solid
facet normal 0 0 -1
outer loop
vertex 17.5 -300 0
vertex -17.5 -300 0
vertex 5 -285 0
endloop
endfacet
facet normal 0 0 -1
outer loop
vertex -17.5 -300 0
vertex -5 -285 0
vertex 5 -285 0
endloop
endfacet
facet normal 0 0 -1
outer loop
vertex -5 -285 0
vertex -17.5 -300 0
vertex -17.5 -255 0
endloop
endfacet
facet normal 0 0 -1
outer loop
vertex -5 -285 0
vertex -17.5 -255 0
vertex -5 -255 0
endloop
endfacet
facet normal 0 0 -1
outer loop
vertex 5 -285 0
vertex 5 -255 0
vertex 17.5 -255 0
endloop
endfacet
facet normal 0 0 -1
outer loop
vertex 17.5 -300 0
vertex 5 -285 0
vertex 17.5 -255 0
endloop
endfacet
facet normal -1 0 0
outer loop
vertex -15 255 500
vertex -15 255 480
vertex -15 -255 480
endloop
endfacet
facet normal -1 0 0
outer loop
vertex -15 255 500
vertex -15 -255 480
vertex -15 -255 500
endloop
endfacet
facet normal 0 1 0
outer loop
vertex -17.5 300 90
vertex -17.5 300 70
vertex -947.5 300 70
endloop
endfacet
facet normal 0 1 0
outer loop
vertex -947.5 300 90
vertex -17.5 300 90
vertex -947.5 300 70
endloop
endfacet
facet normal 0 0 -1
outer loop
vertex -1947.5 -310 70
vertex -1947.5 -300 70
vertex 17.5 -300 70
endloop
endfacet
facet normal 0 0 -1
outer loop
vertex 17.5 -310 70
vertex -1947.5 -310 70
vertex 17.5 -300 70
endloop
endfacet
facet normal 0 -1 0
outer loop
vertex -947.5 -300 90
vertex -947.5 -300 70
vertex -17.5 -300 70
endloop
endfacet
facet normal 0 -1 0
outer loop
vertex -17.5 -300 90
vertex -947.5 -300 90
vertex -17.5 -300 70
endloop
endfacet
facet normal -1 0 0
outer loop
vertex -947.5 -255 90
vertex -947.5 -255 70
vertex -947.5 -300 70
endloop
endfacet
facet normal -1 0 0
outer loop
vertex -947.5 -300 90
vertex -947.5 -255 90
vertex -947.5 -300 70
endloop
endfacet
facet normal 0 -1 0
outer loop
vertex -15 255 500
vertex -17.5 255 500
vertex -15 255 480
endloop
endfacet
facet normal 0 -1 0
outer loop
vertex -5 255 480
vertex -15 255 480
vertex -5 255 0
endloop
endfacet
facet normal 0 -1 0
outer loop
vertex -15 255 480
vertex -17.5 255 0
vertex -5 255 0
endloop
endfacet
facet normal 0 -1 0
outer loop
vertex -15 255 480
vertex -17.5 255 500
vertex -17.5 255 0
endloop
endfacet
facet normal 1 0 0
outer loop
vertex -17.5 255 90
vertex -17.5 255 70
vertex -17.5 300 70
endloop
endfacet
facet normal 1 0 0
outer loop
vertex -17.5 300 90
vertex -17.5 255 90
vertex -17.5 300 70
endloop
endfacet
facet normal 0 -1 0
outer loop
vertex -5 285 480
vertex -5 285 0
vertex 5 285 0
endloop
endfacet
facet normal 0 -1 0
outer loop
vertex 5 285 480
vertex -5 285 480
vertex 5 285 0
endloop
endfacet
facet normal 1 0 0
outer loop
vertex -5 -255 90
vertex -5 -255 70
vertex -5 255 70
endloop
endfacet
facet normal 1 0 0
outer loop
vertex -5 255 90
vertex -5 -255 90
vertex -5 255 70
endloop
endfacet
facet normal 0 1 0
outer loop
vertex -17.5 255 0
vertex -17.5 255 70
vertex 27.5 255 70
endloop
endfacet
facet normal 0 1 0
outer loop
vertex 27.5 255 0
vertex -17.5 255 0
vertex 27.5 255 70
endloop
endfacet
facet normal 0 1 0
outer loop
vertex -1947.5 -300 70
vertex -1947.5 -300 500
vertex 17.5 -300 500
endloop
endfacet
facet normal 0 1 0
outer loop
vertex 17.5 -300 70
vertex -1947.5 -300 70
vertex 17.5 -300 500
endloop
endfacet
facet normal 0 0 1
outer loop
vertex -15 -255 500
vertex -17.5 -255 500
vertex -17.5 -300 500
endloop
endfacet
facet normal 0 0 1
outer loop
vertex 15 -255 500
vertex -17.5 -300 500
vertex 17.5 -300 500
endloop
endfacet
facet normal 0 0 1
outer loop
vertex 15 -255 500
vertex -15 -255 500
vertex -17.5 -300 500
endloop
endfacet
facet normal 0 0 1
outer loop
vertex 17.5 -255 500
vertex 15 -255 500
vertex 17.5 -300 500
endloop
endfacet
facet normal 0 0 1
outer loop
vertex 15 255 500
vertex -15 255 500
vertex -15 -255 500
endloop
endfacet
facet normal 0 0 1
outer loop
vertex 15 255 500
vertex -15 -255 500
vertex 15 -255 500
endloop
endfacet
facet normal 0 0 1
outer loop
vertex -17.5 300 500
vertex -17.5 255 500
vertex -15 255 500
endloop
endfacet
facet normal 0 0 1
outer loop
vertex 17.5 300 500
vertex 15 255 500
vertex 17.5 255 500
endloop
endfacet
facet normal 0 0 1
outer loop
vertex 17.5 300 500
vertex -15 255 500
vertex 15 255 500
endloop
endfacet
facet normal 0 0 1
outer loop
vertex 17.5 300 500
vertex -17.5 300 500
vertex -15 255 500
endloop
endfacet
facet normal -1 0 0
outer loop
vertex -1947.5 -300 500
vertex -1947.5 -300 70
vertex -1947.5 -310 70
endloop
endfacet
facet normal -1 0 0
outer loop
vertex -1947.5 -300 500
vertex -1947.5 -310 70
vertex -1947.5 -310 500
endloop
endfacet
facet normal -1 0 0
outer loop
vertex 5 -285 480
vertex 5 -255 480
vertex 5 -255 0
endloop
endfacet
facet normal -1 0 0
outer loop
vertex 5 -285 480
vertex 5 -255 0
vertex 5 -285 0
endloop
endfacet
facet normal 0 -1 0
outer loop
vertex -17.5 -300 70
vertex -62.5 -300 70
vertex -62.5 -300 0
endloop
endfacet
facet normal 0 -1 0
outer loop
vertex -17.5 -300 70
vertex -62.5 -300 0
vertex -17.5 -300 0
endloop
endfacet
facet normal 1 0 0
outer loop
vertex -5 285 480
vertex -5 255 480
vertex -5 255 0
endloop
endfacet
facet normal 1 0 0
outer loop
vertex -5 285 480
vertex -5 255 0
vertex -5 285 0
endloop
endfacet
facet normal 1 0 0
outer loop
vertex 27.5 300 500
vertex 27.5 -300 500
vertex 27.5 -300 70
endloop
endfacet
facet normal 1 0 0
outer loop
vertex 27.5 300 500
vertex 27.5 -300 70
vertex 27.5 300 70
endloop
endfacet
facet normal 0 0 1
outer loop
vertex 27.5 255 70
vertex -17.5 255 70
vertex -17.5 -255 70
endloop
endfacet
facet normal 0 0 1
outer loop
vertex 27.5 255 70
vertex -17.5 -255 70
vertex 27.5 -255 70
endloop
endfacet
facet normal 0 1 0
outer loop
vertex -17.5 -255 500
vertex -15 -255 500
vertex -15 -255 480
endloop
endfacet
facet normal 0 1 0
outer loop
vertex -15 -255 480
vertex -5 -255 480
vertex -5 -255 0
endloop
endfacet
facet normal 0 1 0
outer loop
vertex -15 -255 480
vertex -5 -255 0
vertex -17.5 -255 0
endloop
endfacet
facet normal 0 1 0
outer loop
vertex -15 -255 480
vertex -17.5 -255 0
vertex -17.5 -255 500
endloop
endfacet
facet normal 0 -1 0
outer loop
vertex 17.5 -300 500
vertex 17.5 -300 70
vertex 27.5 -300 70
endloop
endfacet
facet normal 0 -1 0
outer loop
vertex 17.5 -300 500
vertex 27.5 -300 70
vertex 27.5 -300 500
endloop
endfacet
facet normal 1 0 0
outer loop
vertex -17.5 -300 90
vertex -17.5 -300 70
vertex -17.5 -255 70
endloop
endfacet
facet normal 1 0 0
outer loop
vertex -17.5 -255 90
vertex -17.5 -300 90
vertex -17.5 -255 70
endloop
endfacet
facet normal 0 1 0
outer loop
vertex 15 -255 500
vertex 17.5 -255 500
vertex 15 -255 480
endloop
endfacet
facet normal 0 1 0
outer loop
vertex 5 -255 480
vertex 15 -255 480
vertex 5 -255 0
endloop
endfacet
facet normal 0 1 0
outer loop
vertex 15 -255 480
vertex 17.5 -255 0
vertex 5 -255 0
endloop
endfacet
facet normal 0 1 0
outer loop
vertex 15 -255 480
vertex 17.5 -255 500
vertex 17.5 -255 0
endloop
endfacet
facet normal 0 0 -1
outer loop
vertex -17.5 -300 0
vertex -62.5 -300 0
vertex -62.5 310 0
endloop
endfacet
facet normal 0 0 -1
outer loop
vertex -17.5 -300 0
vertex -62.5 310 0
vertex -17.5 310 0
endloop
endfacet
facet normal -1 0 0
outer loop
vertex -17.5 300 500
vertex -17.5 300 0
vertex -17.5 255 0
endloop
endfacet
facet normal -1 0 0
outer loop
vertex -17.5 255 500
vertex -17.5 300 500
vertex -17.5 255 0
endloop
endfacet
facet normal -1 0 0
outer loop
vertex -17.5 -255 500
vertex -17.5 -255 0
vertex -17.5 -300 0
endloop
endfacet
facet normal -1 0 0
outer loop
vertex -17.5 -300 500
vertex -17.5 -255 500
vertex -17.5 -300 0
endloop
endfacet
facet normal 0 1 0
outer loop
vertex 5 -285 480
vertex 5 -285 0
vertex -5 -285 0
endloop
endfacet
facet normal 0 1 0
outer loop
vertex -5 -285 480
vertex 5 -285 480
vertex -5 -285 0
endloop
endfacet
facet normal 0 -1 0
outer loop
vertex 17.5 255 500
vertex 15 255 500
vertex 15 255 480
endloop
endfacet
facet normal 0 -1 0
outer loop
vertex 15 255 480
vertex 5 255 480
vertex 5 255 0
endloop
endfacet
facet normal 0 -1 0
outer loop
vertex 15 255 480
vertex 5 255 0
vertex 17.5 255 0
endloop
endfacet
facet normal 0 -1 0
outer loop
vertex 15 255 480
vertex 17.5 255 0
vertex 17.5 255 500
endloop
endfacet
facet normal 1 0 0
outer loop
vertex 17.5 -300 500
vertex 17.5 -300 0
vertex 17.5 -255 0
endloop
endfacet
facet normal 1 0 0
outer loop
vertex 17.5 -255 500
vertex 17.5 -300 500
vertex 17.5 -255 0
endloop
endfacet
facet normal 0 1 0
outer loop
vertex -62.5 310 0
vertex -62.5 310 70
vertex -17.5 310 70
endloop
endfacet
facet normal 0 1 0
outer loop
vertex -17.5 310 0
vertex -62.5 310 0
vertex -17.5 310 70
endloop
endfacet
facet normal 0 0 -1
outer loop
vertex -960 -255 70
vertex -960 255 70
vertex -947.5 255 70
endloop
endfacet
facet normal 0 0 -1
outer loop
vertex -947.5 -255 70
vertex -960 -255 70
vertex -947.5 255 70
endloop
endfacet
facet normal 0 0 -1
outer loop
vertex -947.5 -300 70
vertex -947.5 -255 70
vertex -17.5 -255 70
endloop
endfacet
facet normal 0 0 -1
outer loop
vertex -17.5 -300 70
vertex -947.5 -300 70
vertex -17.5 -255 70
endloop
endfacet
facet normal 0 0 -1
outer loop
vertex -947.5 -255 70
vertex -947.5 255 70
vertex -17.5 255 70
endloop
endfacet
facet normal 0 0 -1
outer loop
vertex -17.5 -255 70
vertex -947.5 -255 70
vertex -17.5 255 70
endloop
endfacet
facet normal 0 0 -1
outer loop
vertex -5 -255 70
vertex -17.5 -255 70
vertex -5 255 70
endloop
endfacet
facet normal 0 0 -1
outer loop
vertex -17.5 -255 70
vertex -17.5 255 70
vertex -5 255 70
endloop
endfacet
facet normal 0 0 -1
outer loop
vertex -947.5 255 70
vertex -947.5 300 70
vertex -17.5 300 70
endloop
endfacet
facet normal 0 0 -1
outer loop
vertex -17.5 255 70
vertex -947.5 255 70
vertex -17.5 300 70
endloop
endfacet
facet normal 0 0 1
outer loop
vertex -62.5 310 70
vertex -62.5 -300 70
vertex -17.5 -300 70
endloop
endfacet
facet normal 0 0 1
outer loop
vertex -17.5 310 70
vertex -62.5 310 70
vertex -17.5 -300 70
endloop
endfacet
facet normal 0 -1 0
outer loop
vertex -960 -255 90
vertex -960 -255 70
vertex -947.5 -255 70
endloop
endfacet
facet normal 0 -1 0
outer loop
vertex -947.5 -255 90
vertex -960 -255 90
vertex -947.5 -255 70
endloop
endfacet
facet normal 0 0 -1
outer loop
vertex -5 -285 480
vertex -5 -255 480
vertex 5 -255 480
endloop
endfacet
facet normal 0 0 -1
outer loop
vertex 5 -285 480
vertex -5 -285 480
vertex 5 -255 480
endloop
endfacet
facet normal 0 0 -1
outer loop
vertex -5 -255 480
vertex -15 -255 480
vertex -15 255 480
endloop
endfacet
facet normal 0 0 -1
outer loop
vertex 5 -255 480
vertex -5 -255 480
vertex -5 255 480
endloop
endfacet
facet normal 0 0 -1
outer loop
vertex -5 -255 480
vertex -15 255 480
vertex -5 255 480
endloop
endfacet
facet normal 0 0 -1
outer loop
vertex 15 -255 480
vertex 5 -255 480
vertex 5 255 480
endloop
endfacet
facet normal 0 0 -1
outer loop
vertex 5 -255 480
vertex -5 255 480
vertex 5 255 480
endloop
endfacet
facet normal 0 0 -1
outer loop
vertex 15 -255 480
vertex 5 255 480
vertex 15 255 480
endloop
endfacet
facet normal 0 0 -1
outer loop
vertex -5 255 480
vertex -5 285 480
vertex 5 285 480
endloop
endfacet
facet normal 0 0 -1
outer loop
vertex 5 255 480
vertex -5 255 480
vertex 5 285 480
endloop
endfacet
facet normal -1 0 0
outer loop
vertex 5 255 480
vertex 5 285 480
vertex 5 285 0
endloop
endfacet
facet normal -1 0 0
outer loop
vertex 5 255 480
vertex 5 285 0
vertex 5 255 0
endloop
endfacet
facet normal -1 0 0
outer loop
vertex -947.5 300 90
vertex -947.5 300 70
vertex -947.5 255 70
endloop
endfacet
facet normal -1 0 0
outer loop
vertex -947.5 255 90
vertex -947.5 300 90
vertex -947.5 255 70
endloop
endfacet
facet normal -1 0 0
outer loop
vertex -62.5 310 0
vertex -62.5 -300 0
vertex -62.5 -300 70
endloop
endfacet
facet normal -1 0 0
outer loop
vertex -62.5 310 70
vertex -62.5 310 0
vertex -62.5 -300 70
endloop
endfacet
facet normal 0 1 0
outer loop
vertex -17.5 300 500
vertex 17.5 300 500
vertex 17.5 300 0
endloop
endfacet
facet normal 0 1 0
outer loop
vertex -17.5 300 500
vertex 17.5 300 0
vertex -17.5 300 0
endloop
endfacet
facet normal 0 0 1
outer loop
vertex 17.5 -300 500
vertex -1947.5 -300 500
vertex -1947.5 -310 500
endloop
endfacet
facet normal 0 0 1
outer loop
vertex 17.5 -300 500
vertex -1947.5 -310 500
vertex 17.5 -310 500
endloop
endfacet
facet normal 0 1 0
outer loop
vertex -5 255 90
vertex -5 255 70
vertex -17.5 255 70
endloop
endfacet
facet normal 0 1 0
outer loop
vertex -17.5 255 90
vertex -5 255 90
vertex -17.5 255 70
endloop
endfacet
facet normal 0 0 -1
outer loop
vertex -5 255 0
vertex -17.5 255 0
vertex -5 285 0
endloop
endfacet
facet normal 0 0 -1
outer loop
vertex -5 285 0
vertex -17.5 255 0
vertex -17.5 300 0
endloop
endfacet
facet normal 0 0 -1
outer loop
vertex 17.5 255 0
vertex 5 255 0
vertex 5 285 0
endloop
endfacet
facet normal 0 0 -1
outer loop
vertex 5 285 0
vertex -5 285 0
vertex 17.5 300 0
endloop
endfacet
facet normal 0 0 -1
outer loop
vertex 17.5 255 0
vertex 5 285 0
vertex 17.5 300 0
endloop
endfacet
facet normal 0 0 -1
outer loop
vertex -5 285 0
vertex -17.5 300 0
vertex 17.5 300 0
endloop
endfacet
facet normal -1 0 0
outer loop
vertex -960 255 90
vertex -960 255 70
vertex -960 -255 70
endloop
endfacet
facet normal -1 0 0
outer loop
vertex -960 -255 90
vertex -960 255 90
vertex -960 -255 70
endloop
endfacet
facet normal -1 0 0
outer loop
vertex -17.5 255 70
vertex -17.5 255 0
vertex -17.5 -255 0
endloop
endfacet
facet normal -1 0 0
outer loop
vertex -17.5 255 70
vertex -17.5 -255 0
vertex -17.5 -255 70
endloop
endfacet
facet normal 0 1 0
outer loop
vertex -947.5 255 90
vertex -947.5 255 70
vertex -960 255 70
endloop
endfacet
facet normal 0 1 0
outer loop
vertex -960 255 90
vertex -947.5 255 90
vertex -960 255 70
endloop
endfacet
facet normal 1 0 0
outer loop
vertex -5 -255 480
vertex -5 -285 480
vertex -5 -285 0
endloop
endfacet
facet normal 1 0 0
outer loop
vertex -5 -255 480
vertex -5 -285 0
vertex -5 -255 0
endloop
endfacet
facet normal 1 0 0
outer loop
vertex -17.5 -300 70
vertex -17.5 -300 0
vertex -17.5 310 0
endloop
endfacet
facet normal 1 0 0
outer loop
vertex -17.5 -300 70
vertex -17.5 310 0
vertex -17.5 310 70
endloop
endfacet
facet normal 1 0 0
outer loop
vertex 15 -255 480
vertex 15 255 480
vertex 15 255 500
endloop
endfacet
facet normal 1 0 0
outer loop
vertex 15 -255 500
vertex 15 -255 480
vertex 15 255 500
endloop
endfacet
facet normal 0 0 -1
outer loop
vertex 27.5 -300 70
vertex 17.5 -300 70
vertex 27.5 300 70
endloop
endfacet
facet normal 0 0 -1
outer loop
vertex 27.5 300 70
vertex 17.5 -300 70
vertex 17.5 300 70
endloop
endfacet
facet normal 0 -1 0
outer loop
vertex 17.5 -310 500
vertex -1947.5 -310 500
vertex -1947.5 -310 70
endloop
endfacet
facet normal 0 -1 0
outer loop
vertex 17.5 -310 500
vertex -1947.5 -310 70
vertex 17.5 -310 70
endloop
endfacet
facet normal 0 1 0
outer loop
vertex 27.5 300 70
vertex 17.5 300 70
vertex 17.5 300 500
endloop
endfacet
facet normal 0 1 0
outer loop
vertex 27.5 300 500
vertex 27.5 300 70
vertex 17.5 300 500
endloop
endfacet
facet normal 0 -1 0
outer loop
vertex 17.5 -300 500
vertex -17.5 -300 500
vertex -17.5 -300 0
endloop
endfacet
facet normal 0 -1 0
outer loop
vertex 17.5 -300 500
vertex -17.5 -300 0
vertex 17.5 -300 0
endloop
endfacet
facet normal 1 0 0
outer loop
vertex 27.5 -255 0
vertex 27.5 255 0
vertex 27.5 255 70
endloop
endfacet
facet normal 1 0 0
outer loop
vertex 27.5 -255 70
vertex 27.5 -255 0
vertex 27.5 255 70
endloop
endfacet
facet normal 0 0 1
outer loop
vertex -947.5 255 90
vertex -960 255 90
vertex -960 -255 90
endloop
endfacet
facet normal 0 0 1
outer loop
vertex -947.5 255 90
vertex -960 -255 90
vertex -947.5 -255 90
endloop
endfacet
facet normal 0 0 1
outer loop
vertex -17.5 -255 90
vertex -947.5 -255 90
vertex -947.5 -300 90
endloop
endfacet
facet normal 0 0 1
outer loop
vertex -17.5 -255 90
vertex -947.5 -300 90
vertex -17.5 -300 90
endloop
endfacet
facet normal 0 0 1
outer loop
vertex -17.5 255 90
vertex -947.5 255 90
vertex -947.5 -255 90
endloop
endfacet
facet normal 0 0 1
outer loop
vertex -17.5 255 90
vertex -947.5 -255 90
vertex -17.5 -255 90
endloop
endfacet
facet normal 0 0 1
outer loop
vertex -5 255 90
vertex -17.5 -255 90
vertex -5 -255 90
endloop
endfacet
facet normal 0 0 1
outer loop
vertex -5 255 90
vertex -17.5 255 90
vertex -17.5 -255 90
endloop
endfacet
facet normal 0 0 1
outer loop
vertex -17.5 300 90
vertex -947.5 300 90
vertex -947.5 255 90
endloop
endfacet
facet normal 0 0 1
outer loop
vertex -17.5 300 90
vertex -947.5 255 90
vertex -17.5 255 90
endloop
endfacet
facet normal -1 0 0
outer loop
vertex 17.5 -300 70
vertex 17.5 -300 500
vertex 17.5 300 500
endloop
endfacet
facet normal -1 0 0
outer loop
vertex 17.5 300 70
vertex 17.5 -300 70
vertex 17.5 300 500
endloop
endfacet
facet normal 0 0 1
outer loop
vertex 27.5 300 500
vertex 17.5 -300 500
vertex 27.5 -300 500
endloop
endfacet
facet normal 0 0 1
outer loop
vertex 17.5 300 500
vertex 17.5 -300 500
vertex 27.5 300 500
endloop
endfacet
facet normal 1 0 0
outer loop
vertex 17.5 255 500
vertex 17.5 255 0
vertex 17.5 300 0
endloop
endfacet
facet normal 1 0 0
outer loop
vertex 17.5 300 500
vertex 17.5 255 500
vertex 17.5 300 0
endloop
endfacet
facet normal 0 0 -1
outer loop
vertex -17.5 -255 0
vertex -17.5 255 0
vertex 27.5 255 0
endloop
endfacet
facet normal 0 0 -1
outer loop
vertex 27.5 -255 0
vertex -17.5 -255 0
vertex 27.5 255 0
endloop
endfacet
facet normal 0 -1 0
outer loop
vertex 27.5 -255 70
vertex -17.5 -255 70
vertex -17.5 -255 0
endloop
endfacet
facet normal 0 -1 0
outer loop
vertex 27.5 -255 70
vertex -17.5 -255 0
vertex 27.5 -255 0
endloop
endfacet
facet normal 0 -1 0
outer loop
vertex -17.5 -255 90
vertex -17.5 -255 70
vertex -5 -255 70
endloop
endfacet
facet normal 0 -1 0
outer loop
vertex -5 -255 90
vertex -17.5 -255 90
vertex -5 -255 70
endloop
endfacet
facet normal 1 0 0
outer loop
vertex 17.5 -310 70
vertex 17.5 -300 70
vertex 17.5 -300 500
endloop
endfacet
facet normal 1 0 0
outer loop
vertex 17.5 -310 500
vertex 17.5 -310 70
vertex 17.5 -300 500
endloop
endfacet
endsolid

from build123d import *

# Parameters (mm, degrees)
F1_DEPTH  = 500
F2_W      = 30
F2_H      = 20
F3_DEPTH  = 570
F4_W      = 45
F4_H      = 70
F5_DEPTH  = 610
F6_W      = 1965
F6_H      = 430
F7_DEPTH  = 10
F8_W      = 600
F8_H      = 430
F9_DEPTH  = 10
F11_DEPTH = 20
F12_W     = 45
F12_H     = 70
F13_DEPTH = 510


with BuildPart() as f1:
    # F0 (on Top) → F1 (new body)
    with BuildSketch(Plane.XY):
        Polygon((17.5, 300), (-17.5, 300), (-17.5, 255), (-5, 255), (-5, 285), (5, 285), (5, 255), (17.5, 255), align=None)
        Polygon((-5, -255), (-17.5, -255), (-17.5, -300), (17.5, -300), (17.5, -255), (5, -255), (5, -285), (-5, -285), align=None)
    extrude(amount=F1_DEPTH)

    # F2 (on face) → F3 (join, through all)
    with BuildSketch(Plane.XZ.offset(-285)):
        with Locations((0, 490)):
            Rectangle(F2_W, F2_H)
    extrude(amount=F3_DEPTH)


with BuildPart() as f5:
    # F4 (on face) → F5 (new body)
    with BuildSketch(Plane.XZ.offset(300)):
        with Locations((-40, 35)):
            Rectangle(F4_W, F4_H)
    extrude(amount=-F5_DEPTH)


with BuildPart() as f7:
    # F6 (on face) → F7 (new body)
    with BuildSketch(Plane.XZ.offset(300)):
        with Locations((-965, 285)):
            Rectangle(F6_W, F6_H)
    extrude(amount=F7_DEPTH)


with BuildPart() as f9:
    # F8 (on face) → F9 (new body)
    with BuildSketch(Plane.YZ.offset(17.5)):
        with Locations((0, 285)):
            Rectangle(F8_W, F8_H)
    extrude(amount=F9_DEPTH)


with BuildPart() as f11:
    # F10 (on face) → F11 (new body)
    with BuildSketch(Plane.XY.offset(70)):
        Polygon((-17.5, -255), (-5, -255), (-5, 255), (-17.5, 255), (-17.5, 300), (-947.5, 300), (-947.5, 255), (-960, 255), (-960, -255), (-947.5, -255), (-947.5, -300), (-17.5, -300), align=None)
    extrude(amount=F11_DEPTH)


with BuildPart() as f13:
    # F12 (on face) → F13 (new body, through all)
    with BuildSketch(Plane.XZ.offset(-255)):
        with Locations((5, 35)):
            Rectangle(F12_W, F12_H)
    extrude(amount=F13_DEPTH)


solid = Compound([f1.part, f5.part, f7.part, f9.part, f11.part, f13.part])
